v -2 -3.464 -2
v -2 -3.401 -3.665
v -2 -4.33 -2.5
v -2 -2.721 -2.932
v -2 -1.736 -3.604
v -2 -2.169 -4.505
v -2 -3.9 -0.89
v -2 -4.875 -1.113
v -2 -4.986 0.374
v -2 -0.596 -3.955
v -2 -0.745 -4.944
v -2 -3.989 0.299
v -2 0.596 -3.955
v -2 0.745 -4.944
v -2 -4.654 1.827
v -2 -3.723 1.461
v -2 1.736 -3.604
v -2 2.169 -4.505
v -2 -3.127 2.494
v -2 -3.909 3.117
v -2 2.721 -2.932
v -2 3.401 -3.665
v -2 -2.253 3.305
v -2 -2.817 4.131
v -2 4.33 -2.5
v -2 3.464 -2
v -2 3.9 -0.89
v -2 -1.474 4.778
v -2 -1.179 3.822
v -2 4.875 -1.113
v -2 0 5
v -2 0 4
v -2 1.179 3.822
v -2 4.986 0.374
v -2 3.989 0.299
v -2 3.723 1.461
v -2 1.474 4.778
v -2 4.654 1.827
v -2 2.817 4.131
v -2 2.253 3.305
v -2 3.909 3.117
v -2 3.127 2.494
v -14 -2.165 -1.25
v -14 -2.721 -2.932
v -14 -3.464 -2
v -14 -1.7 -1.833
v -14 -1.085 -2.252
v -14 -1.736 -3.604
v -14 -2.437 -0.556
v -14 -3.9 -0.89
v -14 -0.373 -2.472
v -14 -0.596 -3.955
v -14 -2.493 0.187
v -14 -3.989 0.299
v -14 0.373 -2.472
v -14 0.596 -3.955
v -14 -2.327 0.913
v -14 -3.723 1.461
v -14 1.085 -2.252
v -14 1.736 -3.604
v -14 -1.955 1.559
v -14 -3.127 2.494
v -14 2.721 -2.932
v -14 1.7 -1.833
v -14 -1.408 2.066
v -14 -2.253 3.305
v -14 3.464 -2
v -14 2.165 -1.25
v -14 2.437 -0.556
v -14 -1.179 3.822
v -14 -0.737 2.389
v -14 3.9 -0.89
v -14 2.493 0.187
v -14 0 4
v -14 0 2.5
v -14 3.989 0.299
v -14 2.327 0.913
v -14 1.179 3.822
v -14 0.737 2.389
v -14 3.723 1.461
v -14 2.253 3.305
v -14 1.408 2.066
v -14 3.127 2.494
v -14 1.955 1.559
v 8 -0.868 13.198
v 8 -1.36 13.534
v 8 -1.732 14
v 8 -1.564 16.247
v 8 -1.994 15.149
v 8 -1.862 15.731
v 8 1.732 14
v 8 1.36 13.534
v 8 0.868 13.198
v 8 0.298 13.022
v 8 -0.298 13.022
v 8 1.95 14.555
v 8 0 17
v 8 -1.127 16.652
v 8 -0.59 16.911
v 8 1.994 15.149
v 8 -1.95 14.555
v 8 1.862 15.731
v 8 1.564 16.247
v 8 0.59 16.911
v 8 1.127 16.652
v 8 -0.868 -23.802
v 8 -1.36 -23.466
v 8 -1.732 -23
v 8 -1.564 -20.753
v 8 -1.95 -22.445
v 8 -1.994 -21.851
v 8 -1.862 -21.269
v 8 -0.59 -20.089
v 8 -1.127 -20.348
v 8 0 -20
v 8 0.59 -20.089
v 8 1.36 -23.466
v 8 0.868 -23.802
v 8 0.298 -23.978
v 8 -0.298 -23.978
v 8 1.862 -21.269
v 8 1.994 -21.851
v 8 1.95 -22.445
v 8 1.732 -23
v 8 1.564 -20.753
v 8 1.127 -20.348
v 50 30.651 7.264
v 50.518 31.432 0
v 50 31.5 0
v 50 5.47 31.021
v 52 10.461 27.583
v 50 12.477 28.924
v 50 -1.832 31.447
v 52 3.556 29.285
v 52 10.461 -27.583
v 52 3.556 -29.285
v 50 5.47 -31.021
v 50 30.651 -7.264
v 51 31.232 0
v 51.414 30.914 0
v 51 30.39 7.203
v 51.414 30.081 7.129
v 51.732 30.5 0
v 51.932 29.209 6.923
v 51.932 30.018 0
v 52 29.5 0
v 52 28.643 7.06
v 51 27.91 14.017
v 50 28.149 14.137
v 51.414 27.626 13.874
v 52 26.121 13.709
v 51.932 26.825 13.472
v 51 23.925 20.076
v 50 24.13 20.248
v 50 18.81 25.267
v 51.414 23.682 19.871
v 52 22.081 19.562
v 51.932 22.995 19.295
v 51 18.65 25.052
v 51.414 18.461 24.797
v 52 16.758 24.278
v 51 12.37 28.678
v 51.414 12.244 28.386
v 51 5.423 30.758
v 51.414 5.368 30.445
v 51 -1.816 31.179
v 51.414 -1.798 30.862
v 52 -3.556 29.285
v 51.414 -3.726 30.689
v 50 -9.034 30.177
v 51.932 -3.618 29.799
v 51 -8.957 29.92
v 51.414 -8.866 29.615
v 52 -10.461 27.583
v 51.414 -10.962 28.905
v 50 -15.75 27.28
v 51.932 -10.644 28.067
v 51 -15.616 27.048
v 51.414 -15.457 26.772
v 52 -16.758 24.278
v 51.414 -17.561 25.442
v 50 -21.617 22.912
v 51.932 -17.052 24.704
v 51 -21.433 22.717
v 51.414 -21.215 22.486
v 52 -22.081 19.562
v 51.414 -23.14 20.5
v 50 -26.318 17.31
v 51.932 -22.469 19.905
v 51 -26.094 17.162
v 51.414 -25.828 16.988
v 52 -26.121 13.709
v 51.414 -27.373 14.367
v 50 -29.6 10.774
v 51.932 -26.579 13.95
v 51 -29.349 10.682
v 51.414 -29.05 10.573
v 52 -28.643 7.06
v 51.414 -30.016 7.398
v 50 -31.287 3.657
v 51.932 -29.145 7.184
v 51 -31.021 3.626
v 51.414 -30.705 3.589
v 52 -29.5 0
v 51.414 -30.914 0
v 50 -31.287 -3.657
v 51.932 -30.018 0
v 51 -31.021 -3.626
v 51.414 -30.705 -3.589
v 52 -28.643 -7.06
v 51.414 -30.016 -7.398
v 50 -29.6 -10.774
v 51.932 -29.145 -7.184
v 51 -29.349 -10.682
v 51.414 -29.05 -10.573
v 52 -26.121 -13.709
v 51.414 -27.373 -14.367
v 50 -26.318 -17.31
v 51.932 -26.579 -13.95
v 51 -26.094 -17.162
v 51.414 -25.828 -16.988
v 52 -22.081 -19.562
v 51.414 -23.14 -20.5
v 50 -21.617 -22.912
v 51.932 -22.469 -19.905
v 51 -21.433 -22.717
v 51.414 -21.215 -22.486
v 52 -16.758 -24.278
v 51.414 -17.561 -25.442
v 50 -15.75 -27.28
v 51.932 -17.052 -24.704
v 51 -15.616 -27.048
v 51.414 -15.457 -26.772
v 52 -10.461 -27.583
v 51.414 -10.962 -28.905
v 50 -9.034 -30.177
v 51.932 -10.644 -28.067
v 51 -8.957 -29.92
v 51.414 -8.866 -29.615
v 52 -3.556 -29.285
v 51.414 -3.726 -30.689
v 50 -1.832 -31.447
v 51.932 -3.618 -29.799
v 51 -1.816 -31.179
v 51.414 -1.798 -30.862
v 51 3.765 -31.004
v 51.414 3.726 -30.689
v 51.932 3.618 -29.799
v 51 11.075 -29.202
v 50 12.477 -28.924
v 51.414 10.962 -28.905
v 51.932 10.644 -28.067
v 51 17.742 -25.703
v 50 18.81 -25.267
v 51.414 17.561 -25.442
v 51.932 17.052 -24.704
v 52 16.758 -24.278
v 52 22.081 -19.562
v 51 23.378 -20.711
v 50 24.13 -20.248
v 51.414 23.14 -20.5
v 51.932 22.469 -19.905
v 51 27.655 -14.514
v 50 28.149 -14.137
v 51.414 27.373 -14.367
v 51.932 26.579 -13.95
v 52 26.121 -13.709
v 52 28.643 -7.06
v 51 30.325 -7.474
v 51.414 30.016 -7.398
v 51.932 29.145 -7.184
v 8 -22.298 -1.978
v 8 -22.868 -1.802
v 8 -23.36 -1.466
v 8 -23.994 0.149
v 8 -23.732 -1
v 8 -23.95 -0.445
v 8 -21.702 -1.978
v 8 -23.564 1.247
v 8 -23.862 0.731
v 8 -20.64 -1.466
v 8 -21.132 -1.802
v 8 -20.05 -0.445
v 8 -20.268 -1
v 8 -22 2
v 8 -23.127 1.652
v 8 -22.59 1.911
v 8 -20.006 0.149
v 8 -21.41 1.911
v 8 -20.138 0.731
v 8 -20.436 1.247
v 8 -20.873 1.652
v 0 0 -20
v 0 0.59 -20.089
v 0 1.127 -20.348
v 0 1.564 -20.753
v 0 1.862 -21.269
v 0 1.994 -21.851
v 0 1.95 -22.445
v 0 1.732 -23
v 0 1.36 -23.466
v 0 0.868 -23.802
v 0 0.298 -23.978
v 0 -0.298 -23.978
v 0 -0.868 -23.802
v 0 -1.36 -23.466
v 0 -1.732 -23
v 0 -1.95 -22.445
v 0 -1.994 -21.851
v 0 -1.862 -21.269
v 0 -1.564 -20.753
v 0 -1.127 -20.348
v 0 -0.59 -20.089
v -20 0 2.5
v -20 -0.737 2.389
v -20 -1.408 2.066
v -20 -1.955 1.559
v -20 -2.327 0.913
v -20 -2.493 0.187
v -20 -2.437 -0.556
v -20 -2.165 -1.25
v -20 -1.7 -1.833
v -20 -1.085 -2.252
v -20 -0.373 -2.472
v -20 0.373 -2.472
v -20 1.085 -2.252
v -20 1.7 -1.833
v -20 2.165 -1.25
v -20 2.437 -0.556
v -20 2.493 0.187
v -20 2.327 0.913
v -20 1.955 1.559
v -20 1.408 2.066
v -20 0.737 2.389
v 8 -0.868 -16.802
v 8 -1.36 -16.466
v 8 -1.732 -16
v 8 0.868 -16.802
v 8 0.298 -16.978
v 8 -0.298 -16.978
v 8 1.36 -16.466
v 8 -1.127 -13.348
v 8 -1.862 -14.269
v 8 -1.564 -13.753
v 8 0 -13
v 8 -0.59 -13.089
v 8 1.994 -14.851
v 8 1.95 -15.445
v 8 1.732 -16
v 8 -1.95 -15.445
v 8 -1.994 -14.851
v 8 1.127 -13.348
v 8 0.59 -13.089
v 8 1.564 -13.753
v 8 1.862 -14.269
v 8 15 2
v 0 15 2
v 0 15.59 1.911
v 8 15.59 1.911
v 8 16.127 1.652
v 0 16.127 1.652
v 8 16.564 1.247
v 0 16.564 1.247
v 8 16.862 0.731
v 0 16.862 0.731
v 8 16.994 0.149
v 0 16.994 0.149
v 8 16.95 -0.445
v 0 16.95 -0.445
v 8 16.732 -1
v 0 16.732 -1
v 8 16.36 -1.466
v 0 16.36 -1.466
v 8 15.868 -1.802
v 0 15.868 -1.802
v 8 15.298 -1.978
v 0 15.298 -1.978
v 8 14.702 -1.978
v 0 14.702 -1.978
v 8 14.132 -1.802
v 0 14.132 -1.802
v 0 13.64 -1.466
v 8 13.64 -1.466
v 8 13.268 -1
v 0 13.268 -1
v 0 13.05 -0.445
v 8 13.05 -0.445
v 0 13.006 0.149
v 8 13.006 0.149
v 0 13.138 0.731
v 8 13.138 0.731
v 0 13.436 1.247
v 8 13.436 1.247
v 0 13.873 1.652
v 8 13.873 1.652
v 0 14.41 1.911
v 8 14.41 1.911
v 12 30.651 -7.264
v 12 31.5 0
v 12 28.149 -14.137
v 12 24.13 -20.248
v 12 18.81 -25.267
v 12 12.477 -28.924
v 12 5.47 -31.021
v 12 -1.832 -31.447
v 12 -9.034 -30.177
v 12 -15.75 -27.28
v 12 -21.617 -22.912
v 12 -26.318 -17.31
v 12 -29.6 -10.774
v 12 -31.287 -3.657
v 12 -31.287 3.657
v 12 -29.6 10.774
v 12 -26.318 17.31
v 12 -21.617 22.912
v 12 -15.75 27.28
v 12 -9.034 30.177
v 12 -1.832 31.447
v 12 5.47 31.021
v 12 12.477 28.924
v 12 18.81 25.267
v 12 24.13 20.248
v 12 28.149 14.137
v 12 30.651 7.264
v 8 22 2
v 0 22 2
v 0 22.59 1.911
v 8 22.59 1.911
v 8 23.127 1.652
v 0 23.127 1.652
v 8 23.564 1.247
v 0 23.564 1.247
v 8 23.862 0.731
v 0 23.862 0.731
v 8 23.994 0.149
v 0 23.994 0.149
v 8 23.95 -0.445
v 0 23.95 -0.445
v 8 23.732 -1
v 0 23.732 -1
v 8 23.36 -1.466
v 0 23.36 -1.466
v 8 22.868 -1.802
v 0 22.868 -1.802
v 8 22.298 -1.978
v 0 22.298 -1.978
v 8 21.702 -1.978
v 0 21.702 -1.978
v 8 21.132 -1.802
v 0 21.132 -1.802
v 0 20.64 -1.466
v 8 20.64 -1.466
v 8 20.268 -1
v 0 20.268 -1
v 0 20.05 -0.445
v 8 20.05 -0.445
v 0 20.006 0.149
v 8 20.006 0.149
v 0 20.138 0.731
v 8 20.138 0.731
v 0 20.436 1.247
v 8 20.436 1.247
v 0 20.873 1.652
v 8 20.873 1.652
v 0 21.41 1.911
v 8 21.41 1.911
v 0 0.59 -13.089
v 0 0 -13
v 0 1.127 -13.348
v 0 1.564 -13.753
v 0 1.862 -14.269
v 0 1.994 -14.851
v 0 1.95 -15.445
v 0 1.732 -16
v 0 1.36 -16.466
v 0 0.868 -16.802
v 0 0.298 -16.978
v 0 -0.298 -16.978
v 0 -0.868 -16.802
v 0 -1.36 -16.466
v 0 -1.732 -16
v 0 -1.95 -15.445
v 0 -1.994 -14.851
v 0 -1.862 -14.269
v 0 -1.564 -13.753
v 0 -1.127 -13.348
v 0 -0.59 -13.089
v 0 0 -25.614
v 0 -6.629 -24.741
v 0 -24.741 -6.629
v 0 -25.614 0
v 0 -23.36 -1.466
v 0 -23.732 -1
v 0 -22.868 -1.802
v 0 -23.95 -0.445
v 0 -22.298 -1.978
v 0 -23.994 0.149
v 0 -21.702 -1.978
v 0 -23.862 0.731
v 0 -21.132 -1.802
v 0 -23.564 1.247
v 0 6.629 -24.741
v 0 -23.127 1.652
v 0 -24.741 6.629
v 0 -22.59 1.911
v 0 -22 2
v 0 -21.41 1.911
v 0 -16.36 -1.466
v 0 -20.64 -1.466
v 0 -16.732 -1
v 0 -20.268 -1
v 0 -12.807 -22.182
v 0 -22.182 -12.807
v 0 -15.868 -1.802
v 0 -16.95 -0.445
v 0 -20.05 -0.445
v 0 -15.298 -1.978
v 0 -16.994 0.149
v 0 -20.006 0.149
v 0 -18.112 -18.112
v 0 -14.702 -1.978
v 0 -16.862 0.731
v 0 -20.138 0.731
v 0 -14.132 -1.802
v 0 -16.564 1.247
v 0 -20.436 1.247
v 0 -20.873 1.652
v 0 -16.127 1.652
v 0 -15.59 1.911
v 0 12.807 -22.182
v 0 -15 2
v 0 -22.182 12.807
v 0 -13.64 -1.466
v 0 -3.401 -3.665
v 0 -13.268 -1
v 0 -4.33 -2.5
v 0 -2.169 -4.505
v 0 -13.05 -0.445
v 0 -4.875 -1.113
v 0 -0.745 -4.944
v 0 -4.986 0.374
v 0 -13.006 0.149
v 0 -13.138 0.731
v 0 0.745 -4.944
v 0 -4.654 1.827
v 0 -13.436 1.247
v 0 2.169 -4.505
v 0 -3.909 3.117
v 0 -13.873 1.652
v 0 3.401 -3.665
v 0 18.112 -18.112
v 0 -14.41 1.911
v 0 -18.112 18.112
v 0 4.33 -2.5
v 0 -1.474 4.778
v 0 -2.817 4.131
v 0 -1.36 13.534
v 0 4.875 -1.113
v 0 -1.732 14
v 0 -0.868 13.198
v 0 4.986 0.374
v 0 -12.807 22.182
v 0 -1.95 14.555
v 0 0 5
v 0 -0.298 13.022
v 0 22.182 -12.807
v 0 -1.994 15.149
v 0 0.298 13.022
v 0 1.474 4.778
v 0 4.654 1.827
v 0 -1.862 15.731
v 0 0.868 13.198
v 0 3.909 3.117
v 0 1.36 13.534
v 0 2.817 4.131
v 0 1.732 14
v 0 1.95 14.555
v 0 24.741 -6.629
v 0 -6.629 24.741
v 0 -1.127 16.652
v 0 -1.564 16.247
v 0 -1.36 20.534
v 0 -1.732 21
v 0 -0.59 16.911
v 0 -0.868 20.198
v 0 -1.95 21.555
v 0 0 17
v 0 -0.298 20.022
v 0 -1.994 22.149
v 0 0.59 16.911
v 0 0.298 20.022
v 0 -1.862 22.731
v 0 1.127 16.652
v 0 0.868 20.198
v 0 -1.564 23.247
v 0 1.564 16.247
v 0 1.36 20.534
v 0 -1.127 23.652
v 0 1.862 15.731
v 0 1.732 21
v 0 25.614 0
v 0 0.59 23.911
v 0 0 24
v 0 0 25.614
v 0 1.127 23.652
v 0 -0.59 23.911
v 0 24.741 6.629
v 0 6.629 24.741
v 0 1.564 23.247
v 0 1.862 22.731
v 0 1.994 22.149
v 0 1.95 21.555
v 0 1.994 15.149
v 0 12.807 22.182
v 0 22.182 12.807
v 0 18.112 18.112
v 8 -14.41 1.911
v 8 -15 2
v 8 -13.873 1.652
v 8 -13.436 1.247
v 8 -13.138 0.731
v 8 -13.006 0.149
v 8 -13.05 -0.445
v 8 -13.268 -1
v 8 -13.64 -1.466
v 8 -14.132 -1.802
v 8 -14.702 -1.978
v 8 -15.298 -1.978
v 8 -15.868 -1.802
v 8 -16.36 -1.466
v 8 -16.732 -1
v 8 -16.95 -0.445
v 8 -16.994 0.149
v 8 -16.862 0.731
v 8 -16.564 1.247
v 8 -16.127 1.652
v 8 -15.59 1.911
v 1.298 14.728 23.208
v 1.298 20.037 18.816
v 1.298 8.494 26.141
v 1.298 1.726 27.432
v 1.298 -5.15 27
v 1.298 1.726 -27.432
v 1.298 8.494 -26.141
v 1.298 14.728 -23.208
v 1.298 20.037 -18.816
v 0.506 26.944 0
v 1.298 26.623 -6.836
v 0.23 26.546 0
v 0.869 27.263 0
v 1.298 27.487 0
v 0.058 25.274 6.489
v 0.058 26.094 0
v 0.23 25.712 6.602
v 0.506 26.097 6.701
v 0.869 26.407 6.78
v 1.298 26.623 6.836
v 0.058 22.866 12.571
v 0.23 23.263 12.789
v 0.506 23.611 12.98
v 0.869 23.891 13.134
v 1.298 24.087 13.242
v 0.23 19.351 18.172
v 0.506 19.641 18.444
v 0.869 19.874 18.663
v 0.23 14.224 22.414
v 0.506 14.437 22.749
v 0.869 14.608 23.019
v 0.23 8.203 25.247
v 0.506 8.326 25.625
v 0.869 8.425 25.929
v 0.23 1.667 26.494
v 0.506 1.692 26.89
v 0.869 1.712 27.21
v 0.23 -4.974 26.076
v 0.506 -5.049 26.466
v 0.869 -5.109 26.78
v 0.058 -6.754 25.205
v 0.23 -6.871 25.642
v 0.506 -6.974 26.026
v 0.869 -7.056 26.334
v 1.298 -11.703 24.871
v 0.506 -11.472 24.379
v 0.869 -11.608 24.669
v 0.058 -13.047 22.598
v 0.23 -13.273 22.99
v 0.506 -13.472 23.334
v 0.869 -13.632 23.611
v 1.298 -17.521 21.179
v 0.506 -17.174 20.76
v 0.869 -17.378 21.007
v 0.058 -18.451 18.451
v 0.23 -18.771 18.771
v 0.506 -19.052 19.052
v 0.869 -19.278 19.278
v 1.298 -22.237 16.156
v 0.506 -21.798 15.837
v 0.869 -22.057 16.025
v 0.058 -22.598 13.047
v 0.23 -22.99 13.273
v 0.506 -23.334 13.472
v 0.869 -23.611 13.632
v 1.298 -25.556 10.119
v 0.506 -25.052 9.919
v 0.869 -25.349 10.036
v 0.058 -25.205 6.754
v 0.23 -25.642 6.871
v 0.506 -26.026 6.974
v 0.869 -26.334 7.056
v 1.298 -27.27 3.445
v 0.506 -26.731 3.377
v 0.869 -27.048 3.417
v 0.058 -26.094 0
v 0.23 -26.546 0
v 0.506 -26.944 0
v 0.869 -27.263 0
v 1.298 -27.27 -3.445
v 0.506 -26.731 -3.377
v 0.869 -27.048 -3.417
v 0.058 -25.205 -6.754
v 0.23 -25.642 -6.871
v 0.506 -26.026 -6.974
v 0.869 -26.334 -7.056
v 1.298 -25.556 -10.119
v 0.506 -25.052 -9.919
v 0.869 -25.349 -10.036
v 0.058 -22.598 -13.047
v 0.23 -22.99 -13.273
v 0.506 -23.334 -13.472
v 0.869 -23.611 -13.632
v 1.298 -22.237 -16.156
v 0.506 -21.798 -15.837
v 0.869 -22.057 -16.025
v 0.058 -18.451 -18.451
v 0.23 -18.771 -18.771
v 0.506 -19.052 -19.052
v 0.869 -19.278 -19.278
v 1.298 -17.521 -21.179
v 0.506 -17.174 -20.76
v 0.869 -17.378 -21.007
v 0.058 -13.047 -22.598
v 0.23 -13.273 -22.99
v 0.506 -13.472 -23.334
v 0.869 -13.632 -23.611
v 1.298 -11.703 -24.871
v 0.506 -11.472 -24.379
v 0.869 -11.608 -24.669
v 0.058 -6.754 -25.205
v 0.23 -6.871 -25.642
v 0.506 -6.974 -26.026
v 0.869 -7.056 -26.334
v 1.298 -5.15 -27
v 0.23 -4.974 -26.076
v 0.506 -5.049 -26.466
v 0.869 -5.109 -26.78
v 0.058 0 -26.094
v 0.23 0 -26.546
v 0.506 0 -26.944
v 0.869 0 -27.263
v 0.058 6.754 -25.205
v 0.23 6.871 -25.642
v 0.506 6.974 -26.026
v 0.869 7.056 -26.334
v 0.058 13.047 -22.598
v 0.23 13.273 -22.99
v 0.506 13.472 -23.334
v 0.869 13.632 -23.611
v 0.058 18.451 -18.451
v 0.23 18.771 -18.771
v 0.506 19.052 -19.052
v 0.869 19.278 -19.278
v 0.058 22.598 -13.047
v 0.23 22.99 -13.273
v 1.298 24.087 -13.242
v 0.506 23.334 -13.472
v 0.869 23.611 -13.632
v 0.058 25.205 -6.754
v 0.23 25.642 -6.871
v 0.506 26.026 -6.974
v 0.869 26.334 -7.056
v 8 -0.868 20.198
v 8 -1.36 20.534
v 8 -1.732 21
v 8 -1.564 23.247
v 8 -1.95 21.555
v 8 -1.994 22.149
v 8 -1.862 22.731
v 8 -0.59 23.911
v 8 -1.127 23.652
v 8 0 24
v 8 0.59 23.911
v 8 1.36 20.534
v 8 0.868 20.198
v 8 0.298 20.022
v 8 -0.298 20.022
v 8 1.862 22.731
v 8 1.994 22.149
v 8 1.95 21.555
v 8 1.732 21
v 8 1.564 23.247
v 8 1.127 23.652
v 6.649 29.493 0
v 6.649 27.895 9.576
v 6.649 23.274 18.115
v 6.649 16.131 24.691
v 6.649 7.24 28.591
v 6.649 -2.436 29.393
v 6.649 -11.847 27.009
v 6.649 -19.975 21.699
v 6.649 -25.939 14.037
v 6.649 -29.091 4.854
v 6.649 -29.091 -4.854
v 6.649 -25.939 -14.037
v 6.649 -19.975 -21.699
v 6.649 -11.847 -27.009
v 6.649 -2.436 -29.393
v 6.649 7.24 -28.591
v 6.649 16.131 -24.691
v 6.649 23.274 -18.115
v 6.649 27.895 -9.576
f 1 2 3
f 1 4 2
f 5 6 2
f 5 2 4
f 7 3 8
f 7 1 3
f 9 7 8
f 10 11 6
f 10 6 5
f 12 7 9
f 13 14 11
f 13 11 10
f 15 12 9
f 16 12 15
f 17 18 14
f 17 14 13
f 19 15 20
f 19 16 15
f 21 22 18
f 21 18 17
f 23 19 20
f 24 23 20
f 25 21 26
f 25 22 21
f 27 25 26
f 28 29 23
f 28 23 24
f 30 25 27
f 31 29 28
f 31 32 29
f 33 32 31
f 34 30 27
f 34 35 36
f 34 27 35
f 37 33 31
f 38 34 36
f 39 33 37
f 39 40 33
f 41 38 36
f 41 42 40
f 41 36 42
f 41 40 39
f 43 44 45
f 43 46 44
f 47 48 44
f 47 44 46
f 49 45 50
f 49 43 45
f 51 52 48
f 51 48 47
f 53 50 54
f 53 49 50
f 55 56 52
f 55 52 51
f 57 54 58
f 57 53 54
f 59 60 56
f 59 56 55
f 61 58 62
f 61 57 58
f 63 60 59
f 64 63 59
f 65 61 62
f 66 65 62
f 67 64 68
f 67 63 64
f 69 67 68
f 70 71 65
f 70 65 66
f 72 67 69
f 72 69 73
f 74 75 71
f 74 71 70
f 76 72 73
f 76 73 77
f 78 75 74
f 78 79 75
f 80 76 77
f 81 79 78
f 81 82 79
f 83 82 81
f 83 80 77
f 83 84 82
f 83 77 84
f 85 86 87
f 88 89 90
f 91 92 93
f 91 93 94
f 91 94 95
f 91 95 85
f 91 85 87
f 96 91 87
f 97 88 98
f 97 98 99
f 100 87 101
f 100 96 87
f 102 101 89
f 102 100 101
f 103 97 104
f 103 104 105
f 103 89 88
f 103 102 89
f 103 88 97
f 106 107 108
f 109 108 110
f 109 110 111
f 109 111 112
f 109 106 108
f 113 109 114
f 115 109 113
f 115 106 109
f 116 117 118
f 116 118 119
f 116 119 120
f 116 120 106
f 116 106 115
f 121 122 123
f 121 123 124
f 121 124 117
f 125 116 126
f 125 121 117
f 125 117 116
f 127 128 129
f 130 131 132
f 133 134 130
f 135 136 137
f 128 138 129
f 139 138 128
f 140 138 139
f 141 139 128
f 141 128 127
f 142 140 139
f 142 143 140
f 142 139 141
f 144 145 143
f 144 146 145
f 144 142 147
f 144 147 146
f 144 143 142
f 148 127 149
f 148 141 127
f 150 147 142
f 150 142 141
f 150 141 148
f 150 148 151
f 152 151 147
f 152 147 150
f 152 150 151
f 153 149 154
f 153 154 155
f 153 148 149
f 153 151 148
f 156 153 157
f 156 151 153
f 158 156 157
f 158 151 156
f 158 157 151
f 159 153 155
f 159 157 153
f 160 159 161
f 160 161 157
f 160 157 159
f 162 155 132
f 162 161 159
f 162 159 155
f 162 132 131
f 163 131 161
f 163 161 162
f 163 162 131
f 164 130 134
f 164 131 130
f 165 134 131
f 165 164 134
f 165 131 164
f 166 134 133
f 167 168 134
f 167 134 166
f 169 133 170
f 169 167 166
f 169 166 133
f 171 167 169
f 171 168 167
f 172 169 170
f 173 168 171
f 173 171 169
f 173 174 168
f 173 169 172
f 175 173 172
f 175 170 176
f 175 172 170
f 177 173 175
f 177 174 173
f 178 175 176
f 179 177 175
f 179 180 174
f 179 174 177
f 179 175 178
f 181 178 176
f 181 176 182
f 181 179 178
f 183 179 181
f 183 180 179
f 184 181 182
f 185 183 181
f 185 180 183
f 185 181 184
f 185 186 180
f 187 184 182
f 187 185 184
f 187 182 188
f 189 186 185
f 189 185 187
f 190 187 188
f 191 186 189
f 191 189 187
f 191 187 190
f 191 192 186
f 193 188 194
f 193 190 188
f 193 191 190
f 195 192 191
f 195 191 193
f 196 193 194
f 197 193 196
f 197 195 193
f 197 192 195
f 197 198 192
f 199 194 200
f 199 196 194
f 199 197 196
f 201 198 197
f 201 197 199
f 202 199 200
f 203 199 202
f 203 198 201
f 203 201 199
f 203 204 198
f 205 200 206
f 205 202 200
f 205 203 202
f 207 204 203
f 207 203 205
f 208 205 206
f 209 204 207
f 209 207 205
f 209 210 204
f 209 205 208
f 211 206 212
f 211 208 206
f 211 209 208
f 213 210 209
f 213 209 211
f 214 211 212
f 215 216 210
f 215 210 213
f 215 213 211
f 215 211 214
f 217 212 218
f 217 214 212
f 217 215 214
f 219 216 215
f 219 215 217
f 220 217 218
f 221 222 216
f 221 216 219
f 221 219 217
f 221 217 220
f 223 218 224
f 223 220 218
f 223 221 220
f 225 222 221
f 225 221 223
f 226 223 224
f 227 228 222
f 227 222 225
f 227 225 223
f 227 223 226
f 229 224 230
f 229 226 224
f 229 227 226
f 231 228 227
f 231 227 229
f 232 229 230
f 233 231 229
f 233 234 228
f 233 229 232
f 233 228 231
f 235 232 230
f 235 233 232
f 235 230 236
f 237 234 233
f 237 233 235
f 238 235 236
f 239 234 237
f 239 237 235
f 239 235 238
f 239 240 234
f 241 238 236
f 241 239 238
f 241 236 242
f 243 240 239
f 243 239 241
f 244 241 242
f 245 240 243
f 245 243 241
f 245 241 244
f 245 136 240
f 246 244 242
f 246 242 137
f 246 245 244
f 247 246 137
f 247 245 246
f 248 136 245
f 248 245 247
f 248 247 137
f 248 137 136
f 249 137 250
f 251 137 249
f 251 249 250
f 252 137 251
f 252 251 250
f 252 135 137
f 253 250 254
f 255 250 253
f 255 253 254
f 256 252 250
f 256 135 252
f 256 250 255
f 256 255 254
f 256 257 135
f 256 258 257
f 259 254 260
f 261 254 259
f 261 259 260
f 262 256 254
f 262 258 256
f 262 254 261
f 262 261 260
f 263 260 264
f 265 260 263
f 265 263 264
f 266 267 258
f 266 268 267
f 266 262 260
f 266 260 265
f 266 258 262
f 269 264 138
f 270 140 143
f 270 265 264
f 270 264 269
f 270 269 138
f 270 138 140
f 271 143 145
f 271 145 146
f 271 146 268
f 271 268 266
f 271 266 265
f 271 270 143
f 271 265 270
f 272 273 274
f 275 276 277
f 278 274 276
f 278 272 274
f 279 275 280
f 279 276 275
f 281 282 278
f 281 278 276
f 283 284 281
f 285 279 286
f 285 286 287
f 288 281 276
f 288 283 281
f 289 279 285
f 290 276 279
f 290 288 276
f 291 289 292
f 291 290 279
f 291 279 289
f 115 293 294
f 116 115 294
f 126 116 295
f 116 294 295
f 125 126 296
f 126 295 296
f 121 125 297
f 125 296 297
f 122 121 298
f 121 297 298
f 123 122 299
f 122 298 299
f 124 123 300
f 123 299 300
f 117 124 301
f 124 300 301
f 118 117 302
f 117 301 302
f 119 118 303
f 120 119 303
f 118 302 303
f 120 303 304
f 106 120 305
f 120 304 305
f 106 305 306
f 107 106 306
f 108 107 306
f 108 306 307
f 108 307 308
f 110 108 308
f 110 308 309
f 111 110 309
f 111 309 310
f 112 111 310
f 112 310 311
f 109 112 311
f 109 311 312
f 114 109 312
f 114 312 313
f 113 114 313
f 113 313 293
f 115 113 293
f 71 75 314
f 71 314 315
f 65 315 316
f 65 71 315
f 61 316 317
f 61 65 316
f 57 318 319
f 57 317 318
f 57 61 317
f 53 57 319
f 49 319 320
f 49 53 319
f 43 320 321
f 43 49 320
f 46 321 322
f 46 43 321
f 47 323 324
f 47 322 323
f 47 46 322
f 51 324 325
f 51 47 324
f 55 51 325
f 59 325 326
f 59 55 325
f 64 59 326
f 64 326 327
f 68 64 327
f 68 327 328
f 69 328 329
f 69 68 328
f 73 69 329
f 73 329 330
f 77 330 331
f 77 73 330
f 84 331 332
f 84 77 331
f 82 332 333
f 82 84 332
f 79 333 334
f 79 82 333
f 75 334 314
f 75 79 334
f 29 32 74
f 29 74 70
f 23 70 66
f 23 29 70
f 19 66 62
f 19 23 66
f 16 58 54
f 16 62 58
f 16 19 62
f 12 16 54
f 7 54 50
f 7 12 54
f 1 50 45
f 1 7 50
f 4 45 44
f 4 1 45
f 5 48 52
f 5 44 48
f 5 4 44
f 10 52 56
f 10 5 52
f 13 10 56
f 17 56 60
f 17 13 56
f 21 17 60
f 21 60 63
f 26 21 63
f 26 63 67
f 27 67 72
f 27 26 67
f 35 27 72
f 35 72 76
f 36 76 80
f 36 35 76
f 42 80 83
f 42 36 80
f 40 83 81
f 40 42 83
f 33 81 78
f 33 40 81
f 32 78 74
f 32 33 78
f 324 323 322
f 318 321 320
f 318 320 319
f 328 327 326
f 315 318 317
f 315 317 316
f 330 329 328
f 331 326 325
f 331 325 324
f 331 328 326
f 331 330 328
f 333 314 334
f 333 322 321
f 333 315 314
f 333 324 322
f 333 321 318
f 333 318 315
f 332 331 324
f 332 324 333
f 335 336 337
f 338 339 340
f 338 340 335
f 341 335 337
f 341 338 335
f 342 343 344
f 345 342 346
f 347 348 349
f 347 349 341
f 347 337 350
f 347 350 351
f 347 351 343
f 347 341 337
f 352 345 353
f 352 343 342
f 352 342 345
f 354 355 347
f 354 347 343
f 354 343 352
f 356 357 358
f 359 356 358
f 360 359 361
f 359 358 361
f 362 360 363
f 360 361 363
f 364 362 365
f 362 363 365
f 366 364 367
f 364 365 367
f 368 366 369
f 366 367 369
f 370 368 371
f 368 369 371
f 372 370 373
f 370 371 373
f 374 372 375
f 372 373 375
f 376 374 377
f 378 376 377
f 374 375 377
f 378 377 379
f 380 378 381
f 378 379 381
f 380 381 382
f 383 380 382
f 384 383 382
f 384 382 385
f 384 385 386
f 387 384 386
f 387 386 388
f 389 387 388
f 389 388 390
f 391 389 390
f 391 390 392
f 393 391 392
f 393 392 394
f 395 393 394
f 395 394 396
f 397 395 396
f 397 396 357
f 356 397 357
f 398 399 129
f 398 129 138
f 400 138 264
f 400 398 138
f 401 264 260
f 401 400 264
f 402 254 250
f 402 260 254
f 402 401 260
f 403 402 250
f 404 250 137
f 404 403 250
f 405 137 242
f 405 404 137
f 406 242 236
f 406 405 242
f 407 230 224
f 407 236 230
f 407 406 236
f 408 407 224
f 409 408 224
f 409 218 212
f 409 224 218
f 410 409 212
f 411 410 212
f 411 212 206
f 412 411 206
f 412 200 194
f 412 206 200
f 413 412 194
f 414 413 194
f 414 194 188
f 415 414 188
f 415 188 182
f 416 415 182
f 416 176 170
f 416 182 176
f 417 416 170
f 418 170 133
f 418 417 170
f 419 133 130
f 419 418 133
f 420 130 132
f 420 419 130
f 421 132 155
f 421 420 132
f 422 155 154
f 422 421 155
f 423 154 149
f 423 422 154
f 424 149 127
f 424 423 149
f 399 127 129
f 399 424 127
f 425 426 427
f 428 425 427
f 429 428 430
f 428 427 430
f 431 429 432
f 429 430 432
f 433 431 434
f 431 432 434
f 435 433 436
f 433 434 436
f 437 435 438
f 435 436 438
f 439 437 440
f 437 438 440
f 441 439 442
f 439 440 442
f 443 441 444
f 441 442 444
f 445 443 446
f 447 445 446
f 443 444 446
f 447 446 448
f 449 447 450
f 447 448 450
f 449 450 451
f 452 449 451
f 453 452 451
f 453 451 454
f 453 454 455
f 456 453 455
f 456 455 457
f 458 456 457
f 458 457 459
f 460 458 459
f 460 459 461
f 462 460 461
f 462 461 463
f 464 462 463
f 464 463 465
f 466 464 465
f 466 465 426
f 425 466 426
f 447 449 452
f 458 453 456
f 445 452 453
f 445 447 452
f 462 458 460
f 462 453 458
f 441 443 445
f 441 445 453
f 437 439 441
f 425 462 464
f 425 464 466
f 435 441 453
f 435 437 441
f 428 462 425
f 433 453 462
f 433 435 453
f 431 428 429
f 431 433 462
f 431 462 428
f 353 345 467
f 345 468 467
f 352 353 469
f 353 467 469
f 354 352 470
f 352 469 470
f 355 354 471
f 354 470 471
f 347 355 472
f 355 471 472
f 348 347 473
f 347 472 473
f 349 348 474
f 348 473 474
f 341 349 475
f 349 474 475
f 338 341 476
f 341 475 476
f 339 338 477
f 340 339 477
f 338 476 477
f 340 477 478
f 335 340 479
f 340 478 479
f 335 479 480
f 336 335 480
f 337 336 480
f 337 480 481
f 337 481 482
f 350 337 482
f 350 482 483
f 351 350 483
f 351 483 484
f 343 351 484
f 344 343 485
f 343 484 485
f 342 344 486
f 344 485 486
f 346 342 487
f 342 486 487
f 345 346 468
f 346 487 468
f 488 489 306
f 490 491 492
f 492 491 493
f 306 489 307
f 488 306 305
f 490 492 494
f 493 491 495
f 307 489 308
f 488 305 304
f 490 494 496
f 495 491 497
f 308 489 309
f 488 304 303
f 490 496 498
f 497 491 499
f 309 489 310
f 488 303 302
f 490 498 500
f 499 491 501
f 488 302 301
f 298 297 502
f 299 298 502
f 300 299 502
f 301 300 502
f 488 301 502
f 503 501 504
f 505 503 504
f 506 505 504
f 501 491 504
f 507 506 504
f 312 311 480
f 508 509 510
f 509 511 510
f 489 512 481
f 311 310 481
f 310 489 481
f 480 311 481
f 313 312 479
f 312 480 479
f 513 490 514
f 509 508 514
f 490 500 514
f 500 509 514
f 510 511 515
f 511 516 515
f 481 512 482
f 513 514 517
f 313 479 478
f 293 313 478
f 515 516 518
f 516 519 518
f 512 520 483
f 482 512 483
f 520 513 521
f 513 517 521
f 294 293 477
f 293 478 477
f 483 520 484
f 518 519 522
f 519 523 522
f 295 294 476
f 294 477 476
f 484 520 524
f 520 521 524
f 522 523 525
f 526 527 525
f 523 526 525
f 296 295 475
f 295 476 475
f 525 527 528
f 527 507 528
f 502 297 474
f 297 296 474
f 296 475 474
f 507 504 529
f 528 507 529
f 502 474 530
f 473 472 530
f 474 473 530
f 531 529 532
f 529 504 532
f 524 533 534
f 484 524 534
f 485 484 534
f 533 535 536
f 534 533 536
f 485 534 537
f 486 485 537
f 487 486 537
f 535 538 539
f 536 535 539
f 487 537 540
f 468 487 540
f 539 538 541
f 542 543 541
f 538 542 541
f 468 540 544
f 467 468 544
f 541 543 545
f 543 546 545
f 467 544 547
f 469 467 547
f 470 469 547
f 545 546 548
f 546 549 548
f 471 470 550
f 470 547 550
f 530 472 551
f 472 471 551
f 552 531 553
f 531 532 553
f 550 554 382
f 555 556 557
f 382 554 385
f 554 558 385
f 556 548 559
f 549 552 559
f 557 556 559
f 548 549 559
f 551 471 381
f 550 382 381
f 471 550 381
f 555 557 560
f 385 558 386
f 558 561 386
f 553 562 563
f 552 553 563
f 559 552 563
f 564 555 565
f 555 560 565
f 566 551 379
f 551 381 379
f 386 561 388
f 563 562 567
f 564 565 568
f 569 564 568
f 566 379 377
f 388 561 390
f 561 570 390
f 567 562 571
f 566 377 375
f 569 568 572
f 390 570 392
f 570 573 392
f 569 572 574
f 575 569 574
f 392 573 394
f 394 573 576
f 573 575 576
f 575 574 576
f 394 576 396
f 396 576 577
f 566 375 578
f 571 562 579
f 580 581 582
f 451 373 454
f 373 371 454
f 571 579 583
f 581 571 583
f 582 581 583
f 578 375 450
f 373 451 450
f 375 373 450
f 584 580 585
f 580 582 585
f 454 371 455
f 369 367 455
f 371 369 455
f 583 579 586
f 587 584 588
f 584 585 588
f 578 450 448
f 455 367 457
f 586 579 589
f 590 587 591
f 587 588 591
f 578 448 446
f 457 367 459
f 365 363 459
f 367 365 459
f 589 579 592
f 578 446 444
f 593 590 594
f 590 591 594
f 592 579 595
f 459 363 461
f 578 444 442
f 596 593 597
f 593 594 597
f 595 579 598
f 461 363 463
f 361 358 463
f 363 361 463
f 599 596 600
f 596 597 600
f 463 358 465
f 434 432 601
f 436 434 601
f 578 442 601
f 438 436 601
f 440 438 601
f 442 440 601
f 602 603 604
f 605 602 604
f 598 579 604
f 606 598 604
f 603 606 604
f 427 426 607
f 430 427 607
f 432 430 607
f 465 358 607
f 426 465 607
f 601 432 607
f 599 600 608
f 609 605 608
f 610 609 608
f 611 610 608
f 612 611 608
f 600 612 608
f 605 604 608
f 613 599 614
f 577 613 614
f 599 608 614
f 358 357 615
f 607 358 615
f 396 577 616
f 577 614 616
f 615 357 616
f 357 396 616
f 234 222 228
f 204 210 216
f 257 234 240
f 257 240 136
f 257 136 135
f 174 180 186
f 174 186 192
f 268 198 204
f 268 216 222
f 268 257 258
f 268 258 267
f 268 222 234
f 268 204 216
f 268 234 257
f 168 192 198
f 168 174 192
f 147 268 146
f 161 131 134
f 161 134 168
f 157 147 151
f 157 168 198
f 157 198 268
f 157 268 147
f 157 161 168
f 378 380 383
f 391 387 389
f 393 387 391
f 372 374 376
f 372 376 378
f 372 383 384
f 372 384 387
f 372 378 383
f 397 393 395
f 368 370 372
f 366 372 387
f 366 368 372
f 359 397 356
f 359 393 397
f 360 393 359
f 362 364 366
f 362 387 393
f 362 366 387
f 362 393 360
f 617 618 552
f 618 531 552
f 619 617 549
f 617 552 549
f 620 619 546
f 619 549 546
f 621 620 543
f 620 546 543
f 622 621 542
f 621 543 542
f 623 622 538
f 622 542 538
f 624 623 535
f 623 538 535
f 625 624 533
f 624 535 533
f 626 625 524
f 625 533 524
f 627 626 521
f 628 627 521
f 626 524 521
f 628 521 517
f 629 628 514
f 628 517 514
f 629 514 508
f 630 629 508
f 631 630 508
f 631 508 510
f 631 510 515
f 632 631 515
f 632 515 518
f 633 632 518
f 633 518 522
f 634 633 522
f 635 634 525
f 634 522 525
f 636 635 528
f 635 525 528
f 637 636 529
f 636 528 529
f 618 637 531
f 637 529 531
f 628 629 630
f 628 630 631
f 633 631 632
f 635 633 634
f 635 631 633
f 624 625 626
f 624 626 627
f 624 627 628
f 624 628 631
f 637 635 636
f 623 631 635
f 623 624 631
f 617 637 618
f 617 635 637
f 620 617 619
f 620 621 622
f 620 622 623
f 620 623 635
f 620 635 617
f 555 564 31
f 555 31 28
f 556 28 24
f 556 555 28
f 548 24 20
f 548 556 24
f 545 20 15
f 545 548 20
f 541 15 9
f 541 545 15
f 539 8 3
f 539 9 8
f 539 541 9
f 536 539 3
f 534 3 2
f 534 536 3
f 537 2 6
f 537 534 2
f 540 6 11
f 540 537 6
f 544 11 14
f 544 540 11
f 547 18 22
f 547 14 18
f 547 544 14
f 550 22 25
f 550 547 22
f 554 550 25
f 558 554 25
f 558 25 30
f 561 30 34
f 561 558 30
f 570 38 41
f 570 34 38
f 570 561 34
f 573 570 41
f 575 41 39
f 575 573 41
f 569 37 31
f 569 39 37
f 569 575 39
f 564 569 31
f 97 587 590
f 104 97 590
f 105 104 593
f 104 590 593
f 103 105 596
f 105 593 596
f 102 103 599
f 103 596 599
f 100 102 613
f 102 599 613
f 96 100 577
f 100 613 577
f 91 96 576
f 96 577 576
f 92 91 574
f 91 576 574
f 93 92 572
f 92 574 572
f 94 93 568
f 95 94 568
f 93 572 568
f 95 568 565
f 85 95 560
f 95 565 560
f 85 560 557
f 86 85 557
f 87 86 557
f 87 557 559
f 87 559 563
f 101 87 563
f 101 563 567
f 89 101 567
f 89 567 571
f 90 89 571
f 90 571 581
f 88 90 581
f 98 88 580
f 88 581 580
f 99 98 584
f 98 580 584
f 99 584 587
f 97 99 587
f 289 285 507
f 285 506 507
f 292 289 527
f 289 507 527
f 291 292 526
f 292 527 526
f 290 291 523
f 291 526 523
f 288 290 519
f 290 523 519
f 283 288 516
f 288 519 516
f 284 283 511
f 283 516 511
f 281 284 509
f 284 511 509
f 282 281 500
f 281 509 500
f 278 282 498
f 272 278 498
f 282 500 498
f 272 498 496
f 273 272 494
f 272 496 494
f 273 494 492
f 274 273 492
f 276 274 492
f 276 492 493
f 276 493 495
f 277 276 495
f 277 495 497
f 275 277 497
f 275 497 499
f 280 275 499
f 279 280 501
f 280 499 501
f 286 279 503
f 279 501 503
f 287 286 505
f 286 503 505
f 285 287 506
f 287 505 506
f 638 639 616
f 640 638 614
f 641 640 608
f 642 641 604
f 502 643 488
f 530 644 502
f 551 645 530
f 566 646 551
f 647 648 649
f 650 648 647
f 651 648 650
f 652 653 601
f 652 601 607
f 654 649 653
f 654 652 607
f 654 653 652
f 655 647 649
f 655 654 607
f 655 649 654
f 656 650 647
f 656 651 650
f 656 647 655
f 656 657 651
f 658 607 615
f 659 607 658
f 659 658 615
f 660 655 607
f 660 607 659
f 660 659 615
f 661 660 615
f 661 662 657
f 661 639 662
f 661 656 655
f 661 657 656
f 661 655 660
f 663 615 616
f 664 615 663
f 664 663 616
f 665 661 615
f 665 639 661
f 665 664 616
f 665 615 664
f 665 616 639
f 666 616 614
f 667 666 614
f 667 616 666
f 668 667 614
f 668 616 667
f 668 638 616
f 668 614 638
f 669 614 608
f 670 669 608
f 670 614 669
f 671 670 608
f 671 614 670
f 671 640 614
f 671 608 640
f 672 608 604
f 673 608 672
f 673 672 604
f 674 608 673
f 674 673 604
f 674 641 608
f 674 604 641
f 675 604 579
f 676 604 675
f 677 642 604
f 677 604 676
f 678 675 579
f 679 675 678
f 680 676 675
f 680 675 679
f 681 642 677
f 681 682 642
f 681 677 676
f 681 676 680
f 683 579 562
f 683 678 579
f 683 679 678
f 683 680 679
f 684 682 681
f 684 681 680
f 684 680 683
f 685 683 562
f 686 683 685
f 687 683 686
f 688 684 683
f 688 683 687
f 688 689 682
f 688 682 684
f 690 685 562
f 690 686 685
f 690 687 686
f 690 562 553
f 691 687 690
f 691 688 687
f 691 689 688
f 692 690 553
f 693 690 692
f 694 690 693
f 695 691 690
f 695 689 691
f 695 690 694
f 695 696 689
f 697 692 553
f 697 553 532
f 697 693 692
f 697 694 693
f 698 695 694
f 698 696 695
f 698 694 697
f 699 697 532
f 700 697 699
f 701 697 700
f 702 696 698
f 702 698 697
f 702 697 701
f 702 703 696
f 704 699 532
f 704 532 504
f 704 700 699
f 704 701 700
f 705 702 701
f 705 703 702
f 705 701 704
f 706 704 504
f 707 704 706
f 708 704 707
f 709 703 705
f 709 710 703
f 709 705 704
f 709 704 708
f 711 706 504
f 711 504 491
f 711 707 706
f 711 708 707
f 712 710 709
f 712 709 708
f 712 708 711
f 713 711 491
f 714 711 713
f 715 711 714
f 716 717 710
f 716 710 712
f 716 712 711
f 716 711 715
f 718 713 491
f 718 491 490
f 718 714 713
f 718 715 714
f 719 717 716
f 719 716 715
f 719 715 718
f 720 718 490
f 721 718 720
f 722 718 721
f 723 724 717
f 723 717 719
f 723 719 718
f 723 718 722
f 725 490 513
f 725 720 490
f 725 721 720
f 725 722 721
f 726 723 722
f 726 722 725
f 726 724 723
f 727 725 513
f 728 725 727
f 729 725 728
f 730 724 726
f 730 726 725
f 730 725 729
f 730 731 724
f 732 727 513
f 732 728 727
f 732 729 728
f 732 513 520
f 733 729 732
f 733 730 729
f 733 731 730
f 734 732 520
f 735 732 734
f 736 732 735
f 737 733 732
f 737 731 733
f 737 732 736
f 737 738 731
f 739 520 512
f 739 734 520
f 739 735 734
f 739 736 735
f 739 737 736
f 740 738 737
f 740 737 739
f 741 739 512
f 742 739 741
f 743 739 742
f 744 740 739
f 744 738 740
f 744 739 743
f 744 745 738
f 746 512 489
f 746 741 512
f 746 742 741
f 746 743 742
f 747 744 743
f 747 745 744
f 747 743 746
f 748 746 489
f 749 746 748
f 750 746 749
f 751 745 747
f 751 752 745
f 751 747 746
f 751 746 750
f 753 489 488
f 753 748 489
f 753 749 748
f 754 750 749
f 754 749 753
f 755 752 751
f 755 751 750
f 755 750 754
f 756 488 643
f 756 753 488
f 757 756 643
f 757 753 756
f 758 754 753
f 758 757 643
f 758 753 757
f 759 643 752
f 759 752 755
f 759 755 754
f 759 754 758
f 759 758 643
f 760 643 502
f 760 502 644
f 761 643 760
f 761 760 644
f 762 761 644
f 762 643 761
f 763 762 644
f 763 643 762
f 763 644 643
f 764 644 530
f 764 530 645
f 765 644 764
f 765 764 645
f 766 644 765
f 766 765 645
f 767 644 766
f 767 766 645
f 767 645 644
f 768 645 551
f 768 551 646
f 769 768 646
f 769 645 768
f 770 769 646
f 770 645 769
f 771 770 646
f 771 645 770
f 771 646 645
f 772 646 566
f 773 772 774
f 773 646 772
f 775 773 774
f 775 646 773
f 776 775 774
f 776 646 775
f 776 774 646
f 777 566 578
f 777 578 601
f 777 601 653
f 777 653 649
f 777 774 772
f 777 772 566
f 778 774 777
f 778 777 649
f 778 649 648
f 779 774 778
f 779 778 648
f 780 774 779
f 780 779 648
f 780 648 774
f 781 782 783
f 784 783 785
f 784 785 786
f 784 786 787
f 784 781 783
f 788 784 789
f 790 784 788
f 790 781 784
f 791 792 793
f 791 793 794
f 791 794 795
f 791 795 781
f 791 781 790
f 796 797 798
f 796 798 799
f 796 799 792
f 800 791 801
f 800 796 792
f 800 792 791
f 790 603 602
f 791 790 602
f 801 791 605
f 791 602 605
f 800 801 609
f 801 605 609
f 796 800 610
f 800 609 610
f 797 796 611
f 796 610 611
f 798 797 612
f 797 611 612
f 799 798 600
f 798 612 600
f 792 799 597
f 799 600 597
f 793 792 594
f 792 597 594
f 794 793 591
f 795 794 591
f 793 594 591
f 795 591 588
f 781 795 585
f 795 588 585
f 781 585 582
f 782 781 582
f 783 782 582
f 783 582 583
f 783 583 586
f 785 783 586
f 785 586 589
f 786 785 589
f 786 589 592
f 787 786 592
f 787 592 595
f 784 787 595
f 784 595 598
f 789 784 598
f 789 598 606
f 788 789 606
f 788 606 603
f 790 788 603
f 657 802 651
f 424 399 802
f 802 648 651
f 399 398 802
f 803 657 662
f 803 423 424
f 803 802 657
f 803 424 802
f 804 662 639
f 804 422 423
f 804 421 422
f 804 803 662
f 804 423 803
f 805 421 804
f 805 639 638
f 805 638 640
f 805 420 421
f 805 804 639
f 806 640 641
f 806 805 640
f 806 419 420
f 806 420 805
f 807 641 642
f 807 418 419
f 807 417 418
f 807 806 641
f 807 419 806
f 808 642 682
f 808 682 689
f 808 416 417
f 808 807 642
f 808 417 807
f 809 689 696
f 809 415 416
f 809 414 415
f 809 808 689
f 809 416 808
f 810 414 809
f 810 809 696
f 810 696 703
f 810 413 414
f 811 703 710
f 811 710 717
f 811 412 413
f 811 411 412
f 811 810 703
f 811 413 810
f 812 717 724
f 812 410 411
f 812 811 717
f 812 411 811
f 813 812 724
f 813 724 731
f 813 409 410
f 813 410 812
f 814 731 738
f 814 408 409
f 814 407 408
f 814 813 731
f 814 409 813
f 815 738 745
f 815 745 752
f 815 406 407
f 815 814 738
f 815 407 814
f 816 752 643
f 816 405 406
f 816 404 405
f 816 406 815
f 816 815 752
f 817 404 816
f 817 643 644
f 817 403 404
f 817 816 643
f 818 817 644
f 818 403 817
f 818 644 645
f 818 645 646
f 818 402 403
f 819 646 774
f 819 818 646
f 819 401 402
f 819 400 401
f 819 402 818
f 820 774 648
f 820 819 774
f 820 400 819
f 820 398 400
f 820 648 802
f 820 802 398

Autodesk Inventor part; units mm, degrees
ref_plane "YZ Plane" through (0, 0, 0) normal (1, 0, 0) x (0, 1, 0)
ref_plane "XZ Plane" through (0, 0, 0) normal (0, 1, 0) x (-1, 0, 0)
ref_plane "XY Plane" through (0, 0, 0) normal (0, 0, 1) x (1, 0, 0)
sketch "Sketch1" plane through (0, 0, 0) normal (0, 0, 1) x (1, 0, 0)
  line L0 (0, 0) -> (0, 27)
  line L1 (0, 0) -> (52, 0)
  line L2 (52, 0) -> (52, 31.5)
  line L3 (52, 31.5) -> (12, 31.5)
  line L4 (12, 31.5) -> (0, 27)
  dimension "d1" = 27
  dimension "d2" = 52
  dimension "d3" = 31.5
  dimension "d4" = 40
revolve "Revolution1" add sketch "Sketch1" angle 360 about axis through (0, 0, 0) along (1, 0, 0)
sketch "Sketch2" plane through (0, 0, 0) normal (-1, 0, 0) x (0, 0, 1)
  circle A0 centre (0, 0) radius 5
  dimension "d6" = 10
extrude "Extrusion1" add sketch "Sketch2" along normal blind 2
sketch "Sketch3" plane through (-2, 0, 0) normal (-1, 0, 0) x (0, 0, 1)
  circle A0 centre (0, 0) radius 4
  dimension "d9" = 8
extrude "Extrusion2" add sketch "Sketch3" along normal blind 12
sketch "Sketch4" plane through (-14, 0, 0) normal (-1, 0, 0) x (0, 0, 1)
  circle A0 centre (0, 0) radius 4 projected
  circle A1 centre (0, 0) radius 2.5
  dimension "d12" = 5
extrude "Extrusion3" add sketch "Sketch4" along normal blind 6 contours A1
thread "Thread1" size "M8x1" class "6g" standard "ANSI Metric M Profile" length 6
thread "Thread2" size "M5x0.8" class "6g" standard "ANSI Metric M Profile" full length
fillet "Fillet1" radius 2 2 edges at (0, -27, 0) (52, -31.5, 0)
sketch "Sketch5" plane through (0, 0, 0) normal (-1, 0, 0) x (0, 0, 1)
  circle A0 centre (0, 15) radius 2
  circle A1 centre (0, 22) radius 2
  circle A2 centre (-15, 0) radius 2
  circle A3 centre (-22, 0) radius 2
  circle A4 centre (0, -15) radius 2
  circle A5 centre (0, -22) radius 2
  circle A6 centre (15, 0) radius 2
  circle A7 centre (22, 0) radius 2
  point P0 (0, 0)
  dimension "d20" = 4
  dimension "d21" = 4
  dimension "d24" = 360
extrude "Extrusion4" cut sketch "Sketch5" against normal blind 8
properties part number "moteur"
